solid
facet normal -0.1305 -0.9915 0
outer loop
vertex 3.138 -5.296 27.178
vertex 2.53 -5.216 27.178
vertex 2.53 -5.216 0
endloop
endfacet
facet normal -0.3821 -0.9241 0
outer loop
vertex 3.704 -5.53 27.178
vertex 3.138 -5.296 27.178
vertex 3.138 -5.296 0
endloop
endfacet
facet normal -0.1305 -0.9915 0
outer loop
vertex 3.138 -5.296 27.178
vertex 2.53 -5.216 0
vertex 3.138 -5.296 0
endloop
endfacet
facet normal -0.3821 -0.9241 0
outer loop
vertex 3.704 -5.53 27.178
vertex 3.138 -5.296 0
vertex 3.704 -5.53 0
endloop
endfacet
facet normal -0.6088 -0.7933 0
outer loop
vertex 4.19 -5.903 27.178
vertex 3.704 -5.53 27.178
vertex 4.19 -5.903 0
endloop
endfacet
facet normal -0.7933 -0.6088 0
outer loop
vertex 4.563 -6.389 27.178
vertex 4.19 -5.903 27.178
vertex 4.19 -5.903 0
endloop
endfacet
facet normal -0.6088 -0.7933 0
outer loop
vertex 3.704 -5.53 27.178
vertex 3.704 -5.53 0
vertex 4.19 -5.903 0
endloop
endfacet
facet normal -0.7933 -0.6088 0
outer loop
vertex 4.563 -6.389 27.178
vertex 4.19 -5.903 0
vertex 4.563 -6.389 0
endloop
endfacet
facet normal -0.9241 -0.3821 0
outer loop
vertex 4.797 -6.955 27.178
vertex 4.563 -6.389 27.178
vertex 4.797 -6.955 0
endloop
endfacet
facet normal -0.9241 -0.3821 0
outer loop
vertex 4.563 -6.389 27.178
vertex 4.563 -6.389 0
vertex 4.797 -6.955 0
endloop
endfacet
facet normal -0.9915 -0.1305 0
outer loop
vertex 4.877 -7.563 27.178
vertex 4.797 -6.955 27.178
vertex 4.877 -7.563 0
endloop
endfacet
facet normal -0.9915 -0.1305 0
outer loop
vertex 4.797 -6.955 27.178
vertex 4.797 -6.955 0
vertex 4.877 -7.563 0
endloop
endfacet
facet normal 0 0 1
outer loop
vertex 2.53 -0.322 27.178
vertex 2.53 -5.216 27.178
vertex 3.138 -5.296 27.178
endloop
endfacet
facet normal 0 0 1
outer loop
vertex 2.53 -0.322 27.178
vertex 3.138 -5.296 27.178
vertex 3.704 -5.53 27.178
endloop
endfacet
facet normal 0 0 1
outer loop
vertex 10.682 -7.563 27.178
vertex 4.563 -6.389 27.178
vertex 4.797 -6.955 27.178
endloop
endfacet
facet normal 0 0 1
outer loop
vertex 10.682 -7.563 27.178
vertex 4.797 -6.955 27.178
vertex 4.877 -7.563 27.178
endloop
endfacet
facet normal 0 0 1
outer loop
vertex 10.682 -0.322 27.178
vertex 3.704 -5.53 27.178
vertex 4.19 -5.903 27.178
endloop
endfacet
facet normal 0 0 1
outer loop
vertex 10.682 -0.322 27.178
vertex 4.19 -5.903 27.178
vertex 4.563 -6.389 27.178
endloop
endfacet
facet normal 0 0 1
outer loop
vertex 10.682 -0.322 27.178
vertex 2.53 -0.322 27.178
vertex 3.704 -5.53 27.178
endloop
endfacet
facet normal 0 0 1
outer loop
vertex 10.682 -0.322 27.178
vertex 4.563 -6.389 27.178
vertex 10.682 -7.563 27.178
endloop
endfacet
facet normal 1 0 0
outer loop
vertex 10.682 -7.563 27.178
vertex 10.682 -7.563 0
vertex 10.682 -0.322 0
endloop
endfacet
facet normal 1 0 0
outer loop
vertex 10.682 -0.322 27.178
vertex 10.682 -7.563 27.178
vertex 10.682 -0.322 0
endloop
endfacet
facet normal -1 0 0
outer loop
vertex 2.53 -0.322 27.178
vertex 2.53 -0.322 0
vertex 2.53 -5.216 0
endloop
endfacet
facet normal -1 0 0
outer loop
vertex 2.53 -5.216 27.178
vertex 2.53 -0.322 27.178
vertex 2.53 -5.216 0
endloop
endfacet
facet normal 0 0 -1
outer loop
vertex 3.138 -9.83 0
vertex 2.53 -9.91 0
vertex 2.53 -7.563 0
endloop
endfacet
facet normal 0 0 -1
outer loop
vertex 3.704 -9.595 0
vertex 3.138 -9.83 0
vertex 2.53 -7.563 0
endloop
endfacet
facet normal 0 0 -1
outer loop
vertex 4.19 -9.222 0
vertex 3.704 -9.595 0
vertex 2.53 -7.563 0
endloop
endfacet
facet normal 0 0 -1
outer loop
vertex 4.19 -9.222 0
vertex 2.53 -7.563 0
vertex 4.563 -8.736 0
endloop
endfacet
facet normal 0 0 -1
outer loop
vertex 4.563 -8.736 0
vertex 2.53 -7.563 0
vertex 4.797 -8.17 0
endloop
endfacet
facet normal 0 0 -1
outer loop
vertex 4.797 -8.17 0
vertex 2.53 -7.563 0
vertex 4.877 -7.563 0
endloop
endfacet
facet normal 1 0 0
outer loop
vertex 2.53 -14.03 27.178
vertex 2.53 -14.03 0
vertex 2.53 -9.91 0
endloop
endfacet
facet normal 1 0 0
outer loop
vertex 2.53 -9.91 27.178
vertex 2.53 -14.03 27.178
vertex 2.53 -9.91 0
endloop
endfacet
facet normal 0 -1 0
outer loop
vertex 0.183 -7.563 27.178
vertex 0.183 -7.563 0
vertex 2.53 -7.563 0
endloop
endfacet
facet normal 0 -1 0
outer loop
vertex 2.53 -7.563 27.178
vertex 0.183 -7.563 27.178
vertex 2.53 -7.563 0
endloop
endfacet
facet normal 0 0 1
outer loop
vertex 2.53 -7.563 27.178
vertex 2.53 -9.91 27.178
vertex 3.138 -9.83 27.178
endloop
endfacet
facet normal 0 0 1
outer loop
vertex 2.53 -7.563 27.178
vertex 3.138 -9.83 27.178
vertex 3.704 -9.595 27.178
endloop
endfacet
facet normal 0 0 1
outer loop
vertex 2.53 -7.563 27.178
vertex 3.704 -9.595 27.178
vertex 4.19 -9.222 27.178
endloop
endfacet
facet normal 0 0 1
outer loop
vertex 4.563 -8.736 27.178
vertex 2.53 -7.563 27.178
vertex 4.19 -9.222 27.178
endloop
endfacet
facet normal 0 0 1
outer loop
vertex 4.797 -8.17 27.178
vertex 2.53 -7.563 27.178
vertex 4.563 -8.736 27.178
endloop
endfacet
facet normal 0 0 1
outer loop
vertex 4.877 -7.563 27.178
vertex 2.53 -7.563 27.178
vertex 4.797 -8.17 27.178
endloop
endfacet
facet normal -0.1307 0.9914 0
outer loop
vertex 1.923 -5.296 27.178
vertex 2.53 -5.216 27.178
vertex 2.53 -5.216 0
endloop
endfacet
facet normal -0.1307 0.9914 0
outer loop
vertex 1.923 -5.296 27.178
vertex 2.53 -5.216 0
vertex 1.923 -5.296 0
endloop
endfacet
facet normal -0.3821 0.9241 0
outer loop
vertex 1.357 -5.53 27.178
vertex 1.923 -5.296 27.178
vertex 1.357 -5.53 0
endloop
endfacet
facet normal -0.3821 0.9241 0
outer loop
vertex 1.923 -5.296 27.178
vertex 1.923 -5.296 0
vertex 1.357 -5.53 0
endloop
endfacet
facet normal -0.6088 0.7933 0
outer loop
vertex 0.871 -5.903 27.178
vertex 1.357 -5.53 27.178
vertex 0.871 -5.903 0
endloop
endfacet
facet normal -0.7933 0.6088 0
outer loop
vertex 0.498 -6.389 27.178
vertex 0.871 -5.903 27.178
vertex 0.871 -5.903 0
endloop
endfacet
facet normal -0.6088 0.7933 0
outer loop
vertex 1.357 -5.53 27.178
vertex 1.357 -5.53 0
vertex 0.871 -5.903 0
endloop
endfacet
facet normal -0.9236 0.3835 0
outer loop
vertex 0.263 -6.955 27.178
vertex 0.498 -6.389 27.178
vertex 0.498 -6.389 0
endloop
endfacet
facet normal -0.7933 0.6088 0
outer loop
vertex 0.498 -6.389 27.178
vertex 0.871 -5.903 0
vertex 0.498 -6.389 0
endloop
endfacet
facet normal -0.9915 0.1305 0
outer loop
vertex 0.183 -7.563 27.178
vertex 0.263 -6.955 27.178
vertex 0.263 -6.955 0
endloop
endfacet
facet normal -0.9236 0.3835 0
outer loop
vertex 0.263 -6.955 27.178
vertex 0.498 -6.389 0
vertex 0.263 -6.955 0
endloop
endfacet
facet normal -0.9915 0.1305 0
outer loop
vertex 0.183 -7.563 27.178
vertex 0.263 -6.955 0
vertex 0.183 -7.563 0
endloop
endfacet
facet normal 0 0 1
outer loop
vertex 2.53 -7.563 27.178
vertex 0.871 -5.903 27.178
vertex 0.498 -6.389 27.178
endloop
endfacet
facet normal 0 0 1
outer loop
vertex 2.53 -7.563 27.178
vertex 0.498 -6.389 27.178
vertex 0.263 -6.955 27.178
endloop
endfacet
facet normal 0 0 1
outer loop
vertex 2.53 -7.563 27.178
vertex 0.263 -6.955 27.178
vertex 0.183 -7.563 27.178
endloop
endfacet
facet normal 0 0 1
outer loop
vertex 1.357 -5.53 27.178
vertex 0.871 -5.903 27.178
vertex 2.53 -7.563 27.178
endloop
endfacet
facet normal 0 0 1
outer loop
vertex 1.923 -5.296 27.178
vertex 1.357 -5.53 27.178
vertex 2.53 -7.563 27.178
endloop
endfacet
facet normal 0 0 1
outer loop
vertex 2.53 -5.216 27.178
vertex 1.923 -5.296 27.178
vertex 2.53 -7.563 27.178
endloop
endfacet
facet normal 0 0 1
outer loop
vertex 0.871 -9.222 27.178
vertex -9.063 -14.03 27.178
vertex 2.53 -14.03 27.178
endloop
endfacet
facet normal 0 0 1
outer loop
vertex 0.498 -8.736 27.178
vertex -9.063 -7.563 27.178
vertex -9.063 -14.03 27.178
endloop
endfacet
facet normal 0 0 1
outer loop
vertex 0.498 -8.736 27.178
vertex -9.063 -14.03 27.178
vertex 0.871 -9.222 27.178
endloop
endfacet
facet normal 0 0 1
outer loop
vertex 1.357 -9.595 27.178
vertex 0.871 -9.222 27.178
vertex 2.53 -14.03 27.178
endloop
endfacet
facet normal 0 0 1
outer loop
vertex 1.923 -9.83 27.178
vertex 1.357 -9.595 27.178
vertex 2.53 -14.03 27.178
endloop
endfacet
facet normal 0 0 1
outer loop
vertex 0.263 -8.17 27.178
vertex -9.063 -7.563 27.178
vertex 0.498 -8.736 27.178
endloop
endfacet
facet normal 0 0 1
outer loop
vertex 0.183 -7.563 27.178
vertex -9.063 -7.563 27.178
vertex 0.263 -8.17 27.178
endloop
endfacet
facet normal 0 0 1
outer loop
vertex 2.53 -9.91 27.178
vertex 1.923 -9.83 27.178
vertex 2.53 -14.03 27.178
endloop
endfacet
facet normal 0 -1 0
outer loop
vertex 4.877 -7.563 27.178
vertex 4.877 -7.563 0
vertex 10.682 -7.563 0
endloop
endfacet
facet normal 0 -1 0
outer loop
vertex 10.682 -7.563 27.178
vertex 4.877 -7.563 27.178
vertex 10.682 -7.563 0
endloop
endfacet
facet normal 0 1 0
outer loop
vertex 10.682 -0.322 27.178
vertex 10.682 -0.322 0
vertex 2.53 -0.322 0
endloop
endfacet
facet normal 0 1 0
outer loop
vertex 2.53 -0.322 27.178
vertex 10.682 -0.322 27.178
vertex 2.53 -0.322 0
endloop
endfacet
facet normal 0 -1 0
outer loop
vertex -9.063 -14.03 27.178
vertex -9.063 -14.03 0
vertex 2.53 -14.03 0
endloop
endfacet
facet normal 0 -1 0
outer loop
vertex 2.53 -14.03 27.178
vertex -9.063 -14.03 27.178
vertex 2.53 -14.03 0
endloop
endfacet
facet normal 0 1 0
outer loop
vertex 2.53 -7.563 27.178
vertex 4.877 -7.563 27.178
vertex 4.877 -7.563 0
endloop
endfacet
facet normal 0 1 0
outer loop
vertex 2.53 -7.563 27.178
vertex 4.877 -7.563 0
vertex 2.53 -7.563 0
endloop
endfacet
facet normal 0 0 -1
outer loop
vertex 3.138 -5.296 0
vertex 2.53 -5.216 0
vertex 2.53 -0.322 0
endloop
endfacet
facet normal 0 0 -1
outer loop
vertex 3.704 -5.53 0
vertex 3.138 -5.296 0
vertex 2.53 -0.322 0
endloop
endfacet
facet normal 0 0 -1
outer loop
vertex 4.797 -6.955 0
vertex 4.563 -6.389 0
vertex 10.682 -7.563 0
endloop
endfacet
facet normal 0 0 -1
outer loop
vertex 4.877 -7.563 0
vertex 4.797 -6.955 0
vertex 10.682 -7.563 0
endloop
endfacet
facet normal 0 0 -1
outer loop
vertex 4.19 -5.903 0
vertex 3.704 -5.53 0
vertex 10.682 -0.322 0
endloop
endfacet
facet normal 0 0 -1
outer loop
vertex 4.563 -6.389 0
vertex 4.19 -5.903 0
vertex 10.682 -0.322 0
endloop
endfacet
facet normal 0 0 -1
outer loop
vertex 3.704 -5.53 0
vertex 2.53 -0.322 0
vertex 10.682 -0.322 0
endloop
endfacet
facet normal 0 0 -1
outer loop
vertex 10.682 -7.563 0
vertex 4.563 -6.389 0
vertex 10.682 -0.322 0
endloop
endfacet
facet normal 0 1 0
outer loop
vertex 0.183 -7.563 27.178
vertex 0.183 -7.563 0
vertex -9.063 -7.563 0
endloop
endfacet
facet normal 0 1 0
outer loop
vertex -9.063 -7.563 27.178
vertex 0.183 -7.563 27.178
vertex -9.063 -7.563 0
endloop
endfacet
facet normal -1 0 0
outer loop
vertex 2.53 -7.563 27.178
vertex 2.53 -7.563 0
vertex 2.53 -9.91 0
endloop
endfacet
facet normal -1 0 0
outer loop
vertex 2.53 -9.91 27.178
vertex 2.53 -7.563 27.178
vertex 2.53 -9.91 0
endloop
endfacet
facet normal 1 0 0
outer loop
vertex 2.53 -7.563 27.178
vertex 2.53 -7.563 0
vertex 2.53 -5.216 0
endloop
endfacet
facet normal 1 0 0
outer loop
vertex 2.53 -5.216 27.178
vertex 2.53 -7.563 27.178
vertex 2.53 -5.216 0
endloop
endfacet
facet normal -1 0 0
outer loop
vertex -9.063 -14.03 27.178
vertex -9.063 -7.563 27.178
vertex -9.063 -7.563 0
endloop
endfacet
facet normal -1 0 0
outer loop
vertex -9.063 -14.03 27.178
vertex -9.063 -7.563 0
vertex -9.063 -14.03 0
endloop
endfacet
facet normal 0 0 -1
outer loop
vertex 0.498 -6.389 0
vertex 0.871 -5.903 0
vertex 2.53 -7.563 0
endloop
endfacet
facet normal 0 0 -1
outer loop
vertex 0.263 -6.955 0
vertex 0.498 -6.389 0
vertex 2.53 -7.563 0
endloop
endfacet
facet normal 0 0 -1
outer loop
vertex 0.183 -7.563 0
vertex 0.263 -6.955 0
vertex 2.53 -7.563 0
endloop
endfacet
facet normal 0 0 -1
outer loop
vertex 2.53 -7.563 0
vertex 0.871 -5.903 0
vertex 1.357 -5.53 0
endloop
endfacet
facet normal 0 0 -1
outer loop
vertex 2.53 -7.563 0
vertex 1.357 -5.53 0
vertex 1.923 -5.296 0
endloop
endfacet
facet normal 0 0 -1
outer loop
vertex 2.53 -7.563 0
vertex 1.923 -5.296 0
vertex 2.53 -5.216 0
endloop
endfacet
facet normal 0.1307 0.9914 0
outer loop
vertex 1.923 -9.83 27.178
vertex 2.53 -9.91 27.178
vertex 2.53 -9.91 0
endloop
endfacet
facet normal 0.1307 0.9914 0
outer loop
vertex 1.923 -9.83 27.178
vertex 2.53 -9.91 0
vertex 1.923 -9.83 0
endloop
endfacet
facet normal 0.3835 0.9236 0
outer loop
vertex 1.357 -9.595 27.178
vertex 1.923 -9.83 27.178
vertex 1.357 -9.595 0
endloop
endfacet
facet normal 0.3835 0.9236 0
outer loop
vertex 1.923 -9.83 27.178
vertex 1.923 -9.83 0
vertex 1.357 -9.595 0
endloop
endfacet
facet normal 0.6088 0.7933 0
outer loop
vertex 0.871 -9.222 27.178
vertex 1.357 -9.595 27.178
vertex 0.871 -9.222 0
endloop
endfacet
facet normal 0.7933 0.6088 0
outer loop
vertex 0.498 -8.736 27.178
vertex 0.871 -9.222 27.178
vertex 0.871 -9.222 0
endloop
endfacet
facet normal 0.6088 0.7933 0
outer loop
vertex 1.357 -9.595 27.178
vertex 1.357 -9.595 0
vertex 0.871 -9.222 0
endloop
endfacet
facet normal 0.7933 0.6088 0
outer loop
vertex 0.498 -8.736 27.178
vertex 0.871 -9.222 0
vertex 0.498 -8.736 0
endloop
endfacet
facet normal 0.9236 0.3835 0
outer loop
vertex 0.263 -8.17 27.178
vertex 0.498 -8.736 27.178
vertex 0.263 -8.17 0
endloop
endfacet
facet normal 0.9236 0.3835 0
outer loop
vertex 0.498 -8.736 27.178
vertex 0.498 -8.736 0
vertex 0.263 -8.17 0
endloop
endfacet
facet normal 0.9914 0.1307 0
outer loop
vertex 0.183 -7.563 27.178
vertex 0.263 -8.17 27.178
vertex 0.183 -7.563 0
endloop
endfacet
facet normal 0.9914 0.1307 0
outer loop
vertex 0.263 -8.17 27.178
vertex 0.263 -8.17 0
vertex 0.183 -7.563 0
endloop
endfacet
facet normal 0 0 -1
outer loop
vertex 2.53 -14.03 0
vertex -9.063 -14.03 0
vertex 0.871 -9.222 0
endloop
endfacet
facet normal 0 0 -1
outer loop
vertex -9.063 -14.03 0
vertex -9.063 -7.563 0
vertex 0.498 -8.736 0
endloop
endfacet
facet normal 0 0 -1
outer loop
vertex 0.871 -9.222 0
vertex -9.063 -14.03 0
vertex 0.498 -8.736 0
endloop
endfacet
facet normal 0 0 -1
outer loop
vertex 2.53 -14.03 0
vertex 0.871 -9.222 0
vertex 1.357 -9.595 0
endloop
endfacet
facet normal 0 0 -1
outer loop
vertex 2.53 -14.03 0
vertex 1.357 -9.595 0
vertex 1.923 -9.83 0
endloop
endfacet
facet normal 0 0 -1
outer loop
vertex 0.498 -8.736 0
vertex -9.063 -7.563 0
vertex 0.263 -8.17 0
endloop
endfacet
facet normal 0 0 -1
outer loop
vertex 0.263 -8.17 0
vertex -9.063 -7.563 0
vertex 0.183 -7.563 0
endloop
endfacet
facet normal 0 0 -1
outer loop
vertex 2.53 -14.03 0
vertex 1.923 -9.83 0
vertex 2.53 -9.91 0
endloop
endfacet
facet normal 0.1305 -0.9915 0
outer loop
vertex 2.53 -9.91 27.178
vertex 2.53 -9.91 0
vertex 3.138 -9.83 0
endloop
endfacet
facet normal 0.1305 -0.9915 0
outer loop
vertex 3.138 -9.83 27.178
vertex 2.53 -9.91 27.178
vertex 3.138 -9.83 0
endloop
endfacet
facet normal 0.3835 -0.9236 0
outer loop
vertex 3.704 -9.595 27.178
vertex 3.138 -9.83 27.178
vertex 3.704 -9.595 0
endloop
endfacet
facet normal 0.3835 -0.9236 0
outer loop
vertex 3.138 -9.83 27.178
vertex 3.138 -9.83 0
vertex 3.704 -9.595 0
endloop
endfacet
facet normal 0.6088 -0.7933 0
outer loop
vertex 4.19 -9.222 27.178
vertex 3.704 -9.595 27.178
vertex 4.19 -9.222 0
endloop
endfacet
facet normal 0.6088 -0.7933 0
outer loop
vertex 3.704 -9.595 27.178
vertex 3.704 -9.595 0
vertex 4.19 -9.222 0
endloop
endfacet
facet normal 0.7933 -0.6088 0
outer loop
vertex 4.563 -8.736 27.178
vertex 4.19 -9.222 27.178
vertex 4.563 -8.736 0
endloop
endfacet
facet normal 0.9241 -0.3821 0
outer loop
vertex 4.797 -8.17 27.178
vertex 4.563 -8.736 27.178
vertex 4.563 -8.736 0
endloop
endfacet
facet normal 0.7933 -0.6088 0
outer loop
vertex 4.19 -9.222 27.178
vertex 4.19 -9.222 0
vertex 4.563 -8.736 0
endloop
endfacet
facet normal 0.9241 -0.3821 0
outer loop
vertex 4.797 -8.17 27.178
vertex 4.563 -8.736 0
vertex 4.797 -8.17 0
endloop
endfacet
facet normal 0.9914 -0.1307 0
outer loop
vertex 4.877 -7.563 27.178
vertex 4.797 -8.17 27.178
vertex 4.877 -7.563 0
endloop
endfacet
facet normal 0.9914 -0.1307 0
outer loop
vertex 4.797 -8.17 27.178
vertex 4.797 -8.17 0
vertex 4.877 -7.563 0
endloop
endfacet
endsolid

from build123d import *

# Parameters (mm, degrees)
F1_DEPTH = 27.178


with BuildPart() as f1:
    # F0 (on Top) → F1 (new body)
    with BuildSketch(Plane.XY):
        with BuildLine():
            Line((2.5301300921, -0.3222003579), (2.5301300921, -5.2159677871))
            ThreePointArc((2.5301300921, -5.2159677871), (4.1896841385, -5.9033775806), (4.877093932, -7.562931627))
            Line((4.877093932, -7.562931627), (10.6824431568, -7.562931627))
            Line((10.6824431568, -7.562931627), (10.6824431568, -0.3222003579))
            Line((10.6824431568, -0.3222003579), (2.5301300921, -0.3222003579))
        make_face()
    extrude(amount=F1_DEPTH)


with BuildPart() as f1b:
    # F0 (on Top) → F1, piece 2 (new body)
    with BuildSketch(Plane.XY):
        with BuildLine():
            Line((0.1831662521, -7.562931627), (-9.0627325699, -7.562931627))
            Line((-9.0627325699, -7.562931627), (-9.0627325699, -14.0296872705))
            Line((-9.0627325699, -14.0296872705), (2.5301300921, -14.0296872705))
            Line((2.5301300921, -14.0296872705), (2.5301300921, -9.909895467))
            ThreePointArc((2.5301300921, -9.909895467), (0.8705760456, -9.2224856734), (0.1831662521, -7.562931627))
        make_face()
    extrude(amount=F1_DEPTH)


with BuildPart() as f1c:
    # F0 (on Top) → F1, piece 3 (new body)
    with BuildSketch(Plane.XY):
        with BuildLine():
            Line((4.877093932, -7.562931627), (2.5301300921, -7.562931627))
            Line((2.5301300921, -7.562931627), (2.5301300921, -9.909895467))
            ThreePointArc((2.5301300921, -9.909895467), (4.1896841385, -9.2224856734), (4.877093932, -7.562931627))
        make_face()
    extrude(amount=F1_DEPTH)


with BuildPart() as f1d:
    # F0 (on Top) → F1, piece 4 (new body)
    with BuildSketch(Plane.XY):
        with BuildLine():
            ThreePointArc((2.5301300921, -5.2159677871), (0.8705760456, -5.9033775806), (0.1831662521, -7.562931627))
            Line((0.1831662521, -7.562931627), (2.5301300921, -7.562931627))
            Line((2.5301300921, -7.562931627), (2.5301300921, -5.2159677871))
        make_face()
    extrude(amount=F1_DEPTH)


solid = Compound([f1.part, f1b.part, f1c.part, f1d.part])
